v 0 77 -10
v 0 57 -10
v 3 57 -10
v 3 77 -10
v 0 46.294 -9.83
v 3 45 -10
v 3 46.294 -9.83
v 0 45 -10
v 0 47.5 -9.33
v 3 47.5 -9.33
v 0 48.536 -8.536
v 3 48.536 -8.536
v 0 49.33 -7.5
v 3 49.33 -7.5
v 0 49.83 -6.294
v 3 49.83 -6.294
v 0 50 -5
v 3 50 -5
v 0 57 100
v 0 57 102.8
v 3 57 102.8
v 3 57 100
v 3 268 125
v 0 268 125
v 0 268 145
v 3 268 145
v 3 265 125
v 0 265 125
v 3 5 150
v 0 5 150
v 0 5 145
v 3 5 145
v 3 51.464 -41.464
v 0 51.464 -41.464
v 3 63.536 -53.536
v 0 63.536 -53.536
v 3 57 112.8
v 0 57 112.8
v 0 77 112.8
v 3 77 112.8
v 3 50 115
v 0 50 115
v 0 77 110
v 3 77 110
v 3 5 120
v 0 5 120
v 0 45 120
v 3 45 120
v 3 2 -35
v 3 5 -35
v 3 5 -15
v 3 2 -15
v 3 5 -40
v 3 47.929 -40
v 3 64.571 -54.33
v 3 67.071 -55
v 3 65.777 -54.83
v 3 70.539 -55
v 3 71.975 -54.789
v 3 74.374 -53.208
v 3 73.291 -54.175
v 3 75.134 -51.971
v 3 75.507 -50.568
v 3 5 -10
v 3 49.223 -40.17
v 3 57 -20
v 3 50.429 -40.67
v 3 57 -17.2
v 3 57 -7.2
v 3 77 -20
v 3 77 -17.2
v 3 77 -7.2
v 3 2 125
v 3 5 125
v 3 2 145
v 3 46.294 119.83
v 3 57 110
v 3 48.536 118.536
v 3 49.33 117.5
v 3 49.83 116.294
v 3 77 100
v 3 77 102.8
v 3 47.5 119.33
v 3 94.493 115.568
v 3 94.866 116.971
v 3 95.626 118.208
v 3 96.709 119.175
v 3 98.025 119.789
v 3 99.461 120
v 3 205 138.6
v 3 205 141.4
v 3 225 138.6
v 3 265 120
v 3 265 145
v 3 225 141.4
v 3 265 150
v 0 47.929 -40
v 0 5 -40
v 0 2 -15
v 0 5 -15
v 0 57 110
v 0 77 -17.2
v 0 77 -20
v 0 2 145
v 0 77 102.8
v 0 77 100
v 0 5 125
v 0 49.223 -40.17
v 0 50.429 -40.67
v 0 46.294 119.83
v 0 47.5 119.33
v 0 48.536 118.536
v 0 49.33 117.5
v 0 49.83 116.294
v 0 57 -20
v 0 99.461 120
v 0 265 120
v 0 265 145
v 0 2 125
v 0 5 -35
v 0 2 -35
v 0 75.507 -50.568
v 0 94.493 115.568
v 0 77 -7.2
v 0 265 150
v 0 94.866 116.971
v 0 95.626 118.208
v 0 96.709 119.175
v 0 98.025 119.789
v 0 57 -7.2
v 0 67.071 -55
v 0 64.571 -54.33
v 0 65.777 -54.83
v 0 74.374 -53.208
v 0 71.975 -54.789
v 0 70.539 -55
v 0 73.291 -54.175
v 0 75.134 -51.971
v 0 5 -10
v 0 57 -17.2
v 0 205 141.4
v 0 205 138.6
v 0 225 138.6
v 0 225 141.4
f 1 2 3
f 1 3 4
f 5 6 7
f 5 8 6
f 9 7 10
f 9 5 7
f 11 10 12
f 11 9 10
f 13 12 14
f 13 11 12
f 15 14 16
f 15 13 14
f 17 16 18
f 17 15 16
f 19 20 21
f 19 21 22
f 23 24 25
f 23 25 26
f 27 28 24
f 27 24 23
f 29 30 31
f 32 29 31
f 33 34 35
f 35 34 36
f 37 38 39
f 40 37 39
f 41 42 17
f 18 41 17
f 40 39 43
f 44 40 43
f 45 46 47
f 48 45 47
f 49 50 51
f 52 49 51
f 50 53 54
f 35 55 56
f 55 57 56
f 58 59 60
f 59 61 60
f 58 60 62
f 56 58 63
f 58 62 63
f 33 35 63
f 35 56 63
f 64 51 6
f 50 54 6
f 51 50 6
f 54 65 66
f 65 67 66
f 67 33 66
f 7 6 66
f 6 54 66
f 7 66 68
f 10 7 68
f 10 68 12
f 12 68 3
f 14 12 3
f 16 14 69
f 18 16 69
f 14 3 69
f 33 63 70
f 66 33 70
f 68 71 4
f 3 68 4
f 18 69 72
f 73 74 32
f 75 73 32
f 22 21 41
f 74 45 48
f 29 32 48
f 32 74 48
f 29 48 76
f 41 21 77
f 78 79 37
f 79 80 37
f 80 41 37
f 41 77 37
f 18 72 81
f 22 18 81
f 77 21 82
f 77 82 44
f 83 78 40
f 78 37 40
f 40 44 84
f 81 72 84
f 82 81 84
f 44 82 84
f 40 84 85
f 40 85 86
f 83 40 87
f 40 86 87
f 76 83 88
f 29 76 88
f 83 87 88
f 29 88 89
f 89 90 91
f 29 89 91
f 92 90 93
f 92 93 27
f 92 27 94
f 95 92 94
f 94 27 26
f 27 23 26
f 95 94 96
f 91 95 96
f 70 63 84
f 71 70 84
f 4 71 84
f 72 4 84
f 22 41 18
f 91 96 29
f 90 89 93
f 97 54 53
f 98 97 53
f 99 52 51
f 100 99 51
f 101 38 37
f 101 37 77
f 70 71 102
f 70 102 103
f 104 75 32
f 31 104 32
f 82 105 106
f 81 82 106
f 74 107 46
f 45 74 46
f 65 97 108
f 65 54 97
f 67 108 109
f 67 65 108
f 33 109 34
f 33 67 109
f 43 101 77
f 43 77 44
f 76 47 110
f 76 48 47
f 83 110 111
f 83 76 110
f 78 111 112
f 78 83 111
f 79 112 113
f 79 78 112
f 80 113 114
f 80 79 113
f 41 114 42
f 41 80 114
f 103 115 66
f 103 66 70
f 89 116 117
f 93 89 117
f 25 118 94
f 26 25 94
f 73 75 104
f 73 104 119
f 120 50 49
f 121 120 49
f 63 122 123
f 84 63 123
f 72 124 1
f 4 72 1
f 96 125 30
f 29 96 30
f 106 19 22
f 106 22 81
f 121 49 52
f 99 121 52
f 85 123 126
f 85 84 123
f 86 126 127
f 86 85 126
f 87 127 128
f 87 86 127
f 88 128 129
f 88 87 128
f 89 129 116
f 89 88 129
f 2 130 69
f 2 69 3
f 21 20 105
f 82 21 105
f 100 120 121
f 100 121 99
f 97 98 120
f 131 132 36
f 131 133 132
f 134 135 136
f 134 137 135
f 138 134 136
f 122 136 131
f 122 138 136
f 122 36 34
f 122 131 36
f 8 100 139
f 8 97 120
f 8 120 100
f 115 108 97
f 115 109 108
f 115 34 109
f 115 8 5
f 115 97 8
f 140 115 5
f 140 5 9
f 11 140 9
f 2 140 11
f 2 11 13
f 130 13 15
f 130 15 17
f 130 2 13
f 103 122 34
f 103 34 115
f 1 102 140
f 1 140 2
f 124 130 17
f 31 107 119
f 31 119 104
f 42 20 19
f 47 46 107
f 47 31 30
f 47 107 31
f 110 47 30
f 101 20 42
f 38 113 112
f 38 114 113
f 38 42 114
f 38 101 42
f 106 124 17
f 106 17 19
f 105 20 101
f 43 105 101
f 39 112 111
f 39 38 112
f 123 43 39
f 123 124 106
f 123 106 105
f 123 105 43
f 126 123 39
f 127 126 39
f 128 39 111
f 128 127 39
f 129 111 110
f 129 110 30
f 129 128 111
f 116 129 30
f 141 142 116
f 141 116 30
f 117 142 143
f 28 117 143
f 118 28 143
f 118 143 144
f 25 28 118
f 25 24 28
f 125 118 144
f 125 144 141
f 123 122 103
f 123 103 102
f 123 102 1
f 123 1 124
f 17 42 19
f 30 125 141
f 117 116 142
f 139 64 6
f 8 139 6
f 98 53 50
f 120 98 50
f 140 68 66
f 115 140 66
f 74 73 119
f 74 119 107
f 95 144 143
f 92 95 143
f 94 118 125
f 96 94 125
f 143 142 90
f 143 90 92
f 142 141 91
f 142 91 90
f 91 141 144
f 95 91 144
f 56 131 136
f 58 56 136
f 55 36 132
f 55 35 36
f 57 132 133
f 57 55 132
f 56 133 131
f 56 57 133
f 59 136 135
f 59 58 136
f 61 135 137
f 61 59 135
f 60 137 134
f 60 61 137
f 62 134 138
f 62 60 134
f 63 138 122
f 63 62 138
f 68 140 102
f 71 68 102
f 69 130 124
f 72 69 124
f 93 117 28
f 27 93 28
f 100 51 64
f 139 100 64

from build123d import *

# Parameters (mm, degrees)
BOSS_EXTRUDE1_START     = -3
BOSS_EXTRUDE1_OUTLINE_W = 2.8
BOSS_EXTRUDE1_OUTLINE_H = 20
BOSS_EXTRUDE1_DEPTH     = 3
SKETCH2_W               = 3
SKETCH2_H               = 20
BOSS_EXTRUDE2_DEPTH     = 3
SKETCH3_W               = 20
SKETCH3_H               = 3
BOSS_EXTRUDE3_DEPTH     = 3
FILLET1_R               = 5
FILLET2_R               = 5


with BuildPart() as part:
    # Boss-Extrude1: read off the stored shape, not the designer's step
    # Boss-Extrude1 outline → Boss-Extrude1 (new body)
    with BuildSketch(Plane(origin=(3, 0, 0), x_dir=(0, 0, -1), z_dir=(1, 0, 0)).offset(BOSS_EXTRUDE1_START)):
        Polygon((55, 65), (55, 75), (-120, 95), (-120, 265), (-150, 265), (-150, 5), (-120, 5), (-120, 50), (40, 50), align=None)
        with Locations((-111.4, 67)):
            Rectangle(BOSS_EXTRUDE1_OUTLINE_W, BOSS_EXTRUDE1_OUTLINE_H, mode=Mode.SUBTRACT)
        with Locations((-101.4, 67)):
            Rectangle(BOSS_EXTRUDE1_OUTLINE_W, BOSS_EXTRUDE1_OUTLINE_H, mode=Mode.SUBTRACT)
        with Locations((8.6, 67)):
            Rectangle(BOSS_EXTRUDE1_OUTLINE_W, BOSS_EXTRUDE1_OUTLINE_H, mode=Mode.SUBTRACT)
        with Locations((18.6, 67)):
            Rectangle(BOSS_EXTRUDE1_OUTLINE_W, BOSS_EXTRUDE1_OUTLINE_H, mode=Mode.SUBTRACT)
        with Locations((-140, 215)):
            Rectangle(BOSS_EXTRUDE1_OUTLINE_W, BOSS_EXTRUDE1_OUTLINE_H, mode=Mode.SUBTRACT)
    extrude(amount=BOSS_EXTRUDE1_DEPTH)

    # Sketch2 → Boss-Extrude2 (add)
    with BuildSketch(Plane(origin=(0, 265, 0), x_dir=(1, 0, 0), z_dir=(0, 1, 0))):
        with Locations((1.5, -135)):
            Rectangle(SKETCH2_W, SKETCH2_H)
    extrude(amount=BOSS_EXTRUDE2_DEPTH)

    # Sketch3 → Boss-Extrude3 (add)
    with BuildSketch(Plane(origin=(3, 0, 0), x_dir=(0, 0, -1), z_dir=(1, 0, 0))):
        with Locations((-135, 3.5)):
            Rectangle(SKETCH3_W, SKETCH3_H)
        Polygon((40, 50), (40, 5), (35, 5), (35, 2), (15, 2), (15, 5), (10, 5), (10, 50), align=None)
    extrude(amount=-BOSS_EXTRUDE3_DEPTH)

    # Fillet1
    fillet1_edges = [part.edges().sort_by_distance(p)[0] for p in [
        (1.5, 65, -55),
        (1.5, 50, -10),
        (1.5, 75, -55),
        (1.5, 50, -40),
        (1.5, 50, 120),
    ]]
    fillet(fillet1_edges, radius=FILLET1_R)

    # Fillet2
    fillet2_edges = [part.edges().sort_by_distance(p)[0] for p in [
        (1.5, 95, 120),
    ]]
    fillet(fillet2_edges, radius=FILLET2_R)


solid = part.part
